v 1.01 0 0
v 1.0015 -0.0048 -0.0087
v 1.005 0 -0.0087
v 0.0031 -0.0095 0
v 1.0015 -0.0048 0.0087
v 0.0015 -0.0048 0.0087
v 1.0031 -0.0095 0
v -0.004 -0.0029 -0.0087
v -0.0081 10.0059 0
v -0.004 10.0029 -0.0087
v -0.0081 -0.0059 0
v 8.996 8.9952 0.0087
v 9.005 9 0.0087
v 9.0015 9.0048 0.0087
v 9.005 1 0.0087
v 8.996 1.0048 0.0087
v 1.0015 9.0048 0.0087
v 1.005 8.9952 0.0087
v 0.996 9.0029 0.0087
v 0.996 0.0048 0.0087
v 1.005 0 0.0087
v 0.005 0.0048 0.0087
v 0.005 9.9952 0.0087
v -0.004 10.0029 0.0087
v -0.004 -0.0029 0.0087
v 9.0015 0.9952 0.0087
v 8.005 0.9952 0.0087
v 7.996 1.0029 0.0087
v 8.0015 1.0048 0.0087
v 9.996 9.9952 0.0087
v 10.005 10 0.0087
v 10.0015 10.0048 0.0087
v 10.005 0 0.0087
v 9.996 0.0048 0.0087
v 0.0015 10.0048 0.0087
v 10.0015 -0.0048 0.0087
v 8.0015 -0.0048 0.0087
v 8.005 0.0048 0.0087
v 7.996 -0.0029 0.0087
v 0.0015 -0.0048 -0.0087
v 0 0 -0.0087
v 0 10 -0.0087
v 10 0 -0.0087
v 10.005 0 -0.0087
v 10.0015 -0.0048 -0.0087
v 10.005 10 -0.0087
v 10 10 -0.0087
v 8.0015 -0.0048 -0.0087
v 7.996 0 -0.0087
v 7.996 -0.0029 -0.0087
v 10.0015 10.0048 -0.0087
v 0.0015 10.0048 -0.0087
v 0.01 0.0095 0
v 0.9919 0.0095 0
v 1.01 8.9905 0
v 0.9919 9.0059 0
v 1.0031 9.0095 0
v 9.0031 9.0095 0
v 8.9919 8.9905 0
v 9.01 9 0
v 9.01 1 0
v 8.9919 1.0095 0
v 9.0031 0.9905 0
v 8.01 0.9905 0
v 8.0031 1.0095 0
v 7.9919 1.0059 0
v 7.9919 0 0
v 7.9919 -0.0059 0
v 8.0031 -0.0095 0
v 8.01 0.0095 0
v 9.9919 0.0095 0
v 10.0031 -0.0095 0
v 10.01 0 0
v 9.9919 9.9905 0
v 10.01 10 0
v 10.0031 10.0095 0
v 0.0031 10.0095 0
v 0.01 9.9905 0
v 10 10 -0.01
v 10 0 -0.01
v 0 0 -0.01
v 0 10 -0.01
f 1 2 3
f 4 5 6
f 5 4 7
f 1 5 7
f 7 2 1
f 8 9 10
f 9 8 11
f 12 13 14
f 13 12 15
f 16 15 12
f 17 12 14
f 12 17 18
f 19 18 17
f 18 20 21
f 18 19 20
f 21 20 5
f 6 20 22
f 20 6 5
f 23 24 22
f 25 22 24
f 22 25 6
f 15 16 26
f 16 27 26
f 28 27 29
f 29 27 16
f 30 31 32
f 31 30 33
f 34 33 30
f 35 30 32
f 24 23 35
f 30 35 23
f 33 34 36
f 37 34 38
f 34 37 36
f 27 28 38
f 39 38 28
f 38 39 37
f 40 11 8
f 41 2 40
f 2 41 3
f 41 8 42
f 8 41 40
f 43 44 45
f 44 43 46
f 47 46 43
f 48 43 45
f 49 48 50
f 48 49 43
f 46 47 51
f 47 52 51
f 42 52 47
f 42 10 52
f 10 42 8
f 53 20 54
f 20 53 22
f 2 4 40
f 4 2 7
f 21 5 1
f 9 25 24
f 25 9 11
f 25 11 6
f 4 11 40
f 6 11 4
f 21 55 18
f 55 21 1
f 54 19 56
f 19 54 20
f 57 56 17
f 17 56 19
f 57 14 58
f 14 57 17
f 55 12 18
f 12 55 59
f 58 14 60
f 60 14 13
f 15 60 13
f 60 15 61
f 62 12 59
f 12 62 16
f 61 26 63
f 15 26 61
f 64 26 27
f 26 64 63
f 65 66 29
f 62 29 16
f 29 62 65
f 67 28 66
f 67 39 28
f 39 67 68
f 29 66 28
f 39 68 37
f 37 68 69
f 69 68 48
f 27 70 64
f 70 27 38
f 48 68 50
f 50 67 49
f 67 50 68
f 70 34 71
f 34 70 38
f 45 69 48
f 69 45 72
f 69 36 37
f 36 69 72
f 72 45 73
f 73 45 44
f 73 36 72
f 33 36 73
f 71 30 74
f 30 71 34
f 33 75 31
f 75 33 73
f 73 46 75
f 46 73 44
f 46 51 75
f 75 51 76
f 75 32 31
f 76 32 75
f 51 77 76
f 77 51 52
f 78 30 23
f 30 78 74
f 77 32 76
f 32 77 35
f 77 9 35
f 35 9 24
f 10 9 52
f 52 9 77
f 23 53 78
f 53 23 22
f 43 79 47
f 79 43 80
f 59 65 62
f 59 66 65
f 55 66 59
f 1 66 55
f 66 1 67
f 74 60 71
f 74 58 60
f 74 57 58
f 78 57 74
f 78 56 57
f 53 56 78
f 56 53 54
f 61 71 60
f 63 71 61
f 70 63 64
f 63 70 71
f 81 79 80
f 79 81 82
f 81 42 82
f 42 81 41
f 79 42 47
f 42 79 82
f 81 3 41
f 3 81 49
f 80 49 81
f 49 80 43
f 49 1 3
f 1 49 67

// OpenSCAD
hull(){
    translate([0, 0]) sphere(0.01);
    translate([1, 0]) sphere(0.01);
}
hull(){
    translate([1, 0]) sphere(0.01);
    translate([1, 1]) sphere(0.01);
}
hull(){
    translate([1, 1]) sphere(0.01);
    translate([1, 2]) sphere(0.01);
}
hull(){
    translate([1, 2]) sphere(0.01);
    translate([1, 3]) sphere(0.01);
}
hull(){
    translate([1, 3]) sphere(0.01);
    translate([1, 4]) sphere(0.01);
}
hull(){
    translate([1, 4]) sphere(0.01);
    translate([1, 5]) sphere(0.01);
}
hull(){
    translate([1, 5]) sphere(0.01);
    translate([1, 6]) sphere(0.01);
}
hull(){
    translate([1, 6]) sphere(0.01);
    translate([1, 7]) sphere(0.01);
}
hull(){
    translate([1, 7]) sphere(0.01);
    translate([1, 8]) sphere(0.01);
}
hull(){
    translate([1, 8]) sphere(0.01);
    translate([1, 9]) sphere(0.01);
}
hull(){
    translate([1, 9]) sphere(0.01);
    translate([2, 9]) sphere(0.01);
}
hull(){
    translate([2, 9]) sphere(0.01);
    translate([3, 9]) sphere(0.01);
}
hull(){
    translate([3, 9]) sphere(0.01);
    translate([4, 9]) sphere(0.01);
}
hull(){
    translate([4, 9]) sphere(0.01);
    translate([5, 9]) sphere(0.01);
}
hull(){
    translate([5, 9]) sphere(0.01);
    translate([6, 9]) sphere(0.01);
}
hull(){
    translate([6, 9]) sphere(0.01);
    translate([7, 9]) sphere(0.01);
}
hull(){
    translate([7, 9]) sphere(0.01);
    translate([8, 9]) sphere(0.01);
}
hull(){
    translate([8, 9]) sphere(0.01);
    translate([9, 9]) sphere(0.01);
}
hull(){
    translate([9, 9]) sphere(0.01);
    translate([9, 8]) sphere(0.01);
}
hull(){
    translate([9, 8]) sphere(0.01);
    translate([9, 7]) sphere(0.01);
}
hull(){
    translate([9, 7]) sphere(0.01);
    translate([9, 6]) sphere(0.01);
}
hull(){
    translate([9, 6]) sphere(0.01);
    translate([9, 5]) sphere(0.01);
}
hull(){
    translate([9, 5]) sphere(0.01);
    translate([9, 4]) sphere(0.01);
}
hull(){
    translate([9, 4]) sphere(0.01);
    translate([9, 3]) sphere(0.01);
}
hull(){
    translate([9, 3]) sphere(0.01);
    translate([9, 2]) sphere(0.01);
}
hull(){
    translate([9, 2]) sphere(0.01);
    translate([9, 1]) sphere(0.01);
}
hull(){
    translate([9, 1]) sphere(0.01);
    translate([8, 1]) sphere(0.01);
}
hull(){
    translate([8, 1]) sphere(0.01);
    translate([8, 0]) sphere(0.01);
}
hull(){
    translate([8, 0]) sphere(0.01);
    translate([9, 0]) sphere(0.01);
}
hull(){
    translate([9, 0]) sphere(0.01);
    translate([10, 0]) sphere(0.01);
}
hull(){
    translate([10, 0]) sphere(0.01);
    translate([10, 1]) sphere(0.01);
}
hull(){
    translate([10, 1]) sphere(0.01);
    translate([10, 2]) sphere(0.01);
}
hull(){
    translate([10, 2]) sphere(0.01);
    translate([10, 3]) sphere(0.01);
}
hull(){
    translate([10, 3]) sphere(0.01);
    translate([10, 4]) sphere(0.01);
}
hull(){
    translate([10, 4]) sphere(0.01);
    translate([10, 5]) sphere(0.01);
}
hull(){
    translate([10, 5]) sphere(0.01);
    translate([10, 6]) sphere(0.01);
}
hull(){
    translate([10, 6]) sphere(0.01);
    translate([10, 7]) sphere(0.01);
}
hull(){
    translate([10, 7]) sphere(0.01);
    translate([10, 8]) sphere(0.01);
}
hull(){
    translate([10, 8]) sphere(0.01);
    translate([10, 9]) sphere(0.01);
}
hull(){
    translate([10, 9]) sphere(0.01);
    translate([10, 10]) sphere(0.01);
}
hull(){
    translate([10, 10]) sphere(0.01);
    translate([9, 10]) sphere(0.01);
}
hull(){
    translate([9, 10]) sphere(0.01);
    translate([8, 10]) sphere(0.01);
}
hull(){
    translate([8, 10]) sphere(0.01);
    translate([7, 10]) sphere(0.01);
}
hull(){
    translate([7, 10]) sphere(0.01);
    translate([6, 10]) sphere(0.01);
}
hull(){
    translate([6, 10]) sphere(0.01);
    translate([5, 10]) sphere(0.01);
}
hull(){
    translate([5, 10]) sphere(0.01);
    translate([4, 10]) sphere(0.01);
}
hull(){
    translate([4, 10]) sphere(0.01);
    translate([3, 10]) sphere(0.01);
}
hull(){
    translate([3, 10]) sphere(0.01);
    translate([2, 10]) sphere(0.01);
}
hull(){
    translate([2, 10]) sphere(0.01);
    translate([1, 10]) sphere(0.01);
}
hull(){
    translate([1, 10]) sphere(0.01);
    translate([0, 10]) sphere(0.01);
}
hull(){
    translate([0, 10]) sphere(0.01);
    translate([0, 9]) sphere(0.01);
}
hull(){
    translate([0, 9]) sphere(0.01);
    translate([0, 8]) sphere(0.01);
}
hull(){
    translate([0, 8]) sphere(0.01);
    translate([0, 7]) sphere(0.01);
}
hull(){
    translate([0, 7]) sphere(0.01);
    translate([0, 6]) sphere(0.01);
}
hull(){
    translate([0, 6]) sphere(0.01);
    translate([0, 5]) sphere(0.01);
}
hull(){
    translate([0, 5]) sphere(0.01);
    translate([0, 4]) sphere(0.01);
}
hull(){
    translate([0, 4]) sphere(0.01);
    translate([0, 3]) sphere(0.01);
}
hull(){
    translate([0, 3]) sphere(0.01);
    translate([0, 2]) sphere(0.01);
}
hull(){
    translate([0, 2]) sphere(0.01);
    translate([0, 1]) sphere(0.01);
}
hull(){
    translate([0, 1]) sphere(0.01);
    translate([0, 0]) sphere(0.01);
}
translate([0,0,-0.01]) color([0.1,0.1,0.1]) cube([10,10,0.01]);
